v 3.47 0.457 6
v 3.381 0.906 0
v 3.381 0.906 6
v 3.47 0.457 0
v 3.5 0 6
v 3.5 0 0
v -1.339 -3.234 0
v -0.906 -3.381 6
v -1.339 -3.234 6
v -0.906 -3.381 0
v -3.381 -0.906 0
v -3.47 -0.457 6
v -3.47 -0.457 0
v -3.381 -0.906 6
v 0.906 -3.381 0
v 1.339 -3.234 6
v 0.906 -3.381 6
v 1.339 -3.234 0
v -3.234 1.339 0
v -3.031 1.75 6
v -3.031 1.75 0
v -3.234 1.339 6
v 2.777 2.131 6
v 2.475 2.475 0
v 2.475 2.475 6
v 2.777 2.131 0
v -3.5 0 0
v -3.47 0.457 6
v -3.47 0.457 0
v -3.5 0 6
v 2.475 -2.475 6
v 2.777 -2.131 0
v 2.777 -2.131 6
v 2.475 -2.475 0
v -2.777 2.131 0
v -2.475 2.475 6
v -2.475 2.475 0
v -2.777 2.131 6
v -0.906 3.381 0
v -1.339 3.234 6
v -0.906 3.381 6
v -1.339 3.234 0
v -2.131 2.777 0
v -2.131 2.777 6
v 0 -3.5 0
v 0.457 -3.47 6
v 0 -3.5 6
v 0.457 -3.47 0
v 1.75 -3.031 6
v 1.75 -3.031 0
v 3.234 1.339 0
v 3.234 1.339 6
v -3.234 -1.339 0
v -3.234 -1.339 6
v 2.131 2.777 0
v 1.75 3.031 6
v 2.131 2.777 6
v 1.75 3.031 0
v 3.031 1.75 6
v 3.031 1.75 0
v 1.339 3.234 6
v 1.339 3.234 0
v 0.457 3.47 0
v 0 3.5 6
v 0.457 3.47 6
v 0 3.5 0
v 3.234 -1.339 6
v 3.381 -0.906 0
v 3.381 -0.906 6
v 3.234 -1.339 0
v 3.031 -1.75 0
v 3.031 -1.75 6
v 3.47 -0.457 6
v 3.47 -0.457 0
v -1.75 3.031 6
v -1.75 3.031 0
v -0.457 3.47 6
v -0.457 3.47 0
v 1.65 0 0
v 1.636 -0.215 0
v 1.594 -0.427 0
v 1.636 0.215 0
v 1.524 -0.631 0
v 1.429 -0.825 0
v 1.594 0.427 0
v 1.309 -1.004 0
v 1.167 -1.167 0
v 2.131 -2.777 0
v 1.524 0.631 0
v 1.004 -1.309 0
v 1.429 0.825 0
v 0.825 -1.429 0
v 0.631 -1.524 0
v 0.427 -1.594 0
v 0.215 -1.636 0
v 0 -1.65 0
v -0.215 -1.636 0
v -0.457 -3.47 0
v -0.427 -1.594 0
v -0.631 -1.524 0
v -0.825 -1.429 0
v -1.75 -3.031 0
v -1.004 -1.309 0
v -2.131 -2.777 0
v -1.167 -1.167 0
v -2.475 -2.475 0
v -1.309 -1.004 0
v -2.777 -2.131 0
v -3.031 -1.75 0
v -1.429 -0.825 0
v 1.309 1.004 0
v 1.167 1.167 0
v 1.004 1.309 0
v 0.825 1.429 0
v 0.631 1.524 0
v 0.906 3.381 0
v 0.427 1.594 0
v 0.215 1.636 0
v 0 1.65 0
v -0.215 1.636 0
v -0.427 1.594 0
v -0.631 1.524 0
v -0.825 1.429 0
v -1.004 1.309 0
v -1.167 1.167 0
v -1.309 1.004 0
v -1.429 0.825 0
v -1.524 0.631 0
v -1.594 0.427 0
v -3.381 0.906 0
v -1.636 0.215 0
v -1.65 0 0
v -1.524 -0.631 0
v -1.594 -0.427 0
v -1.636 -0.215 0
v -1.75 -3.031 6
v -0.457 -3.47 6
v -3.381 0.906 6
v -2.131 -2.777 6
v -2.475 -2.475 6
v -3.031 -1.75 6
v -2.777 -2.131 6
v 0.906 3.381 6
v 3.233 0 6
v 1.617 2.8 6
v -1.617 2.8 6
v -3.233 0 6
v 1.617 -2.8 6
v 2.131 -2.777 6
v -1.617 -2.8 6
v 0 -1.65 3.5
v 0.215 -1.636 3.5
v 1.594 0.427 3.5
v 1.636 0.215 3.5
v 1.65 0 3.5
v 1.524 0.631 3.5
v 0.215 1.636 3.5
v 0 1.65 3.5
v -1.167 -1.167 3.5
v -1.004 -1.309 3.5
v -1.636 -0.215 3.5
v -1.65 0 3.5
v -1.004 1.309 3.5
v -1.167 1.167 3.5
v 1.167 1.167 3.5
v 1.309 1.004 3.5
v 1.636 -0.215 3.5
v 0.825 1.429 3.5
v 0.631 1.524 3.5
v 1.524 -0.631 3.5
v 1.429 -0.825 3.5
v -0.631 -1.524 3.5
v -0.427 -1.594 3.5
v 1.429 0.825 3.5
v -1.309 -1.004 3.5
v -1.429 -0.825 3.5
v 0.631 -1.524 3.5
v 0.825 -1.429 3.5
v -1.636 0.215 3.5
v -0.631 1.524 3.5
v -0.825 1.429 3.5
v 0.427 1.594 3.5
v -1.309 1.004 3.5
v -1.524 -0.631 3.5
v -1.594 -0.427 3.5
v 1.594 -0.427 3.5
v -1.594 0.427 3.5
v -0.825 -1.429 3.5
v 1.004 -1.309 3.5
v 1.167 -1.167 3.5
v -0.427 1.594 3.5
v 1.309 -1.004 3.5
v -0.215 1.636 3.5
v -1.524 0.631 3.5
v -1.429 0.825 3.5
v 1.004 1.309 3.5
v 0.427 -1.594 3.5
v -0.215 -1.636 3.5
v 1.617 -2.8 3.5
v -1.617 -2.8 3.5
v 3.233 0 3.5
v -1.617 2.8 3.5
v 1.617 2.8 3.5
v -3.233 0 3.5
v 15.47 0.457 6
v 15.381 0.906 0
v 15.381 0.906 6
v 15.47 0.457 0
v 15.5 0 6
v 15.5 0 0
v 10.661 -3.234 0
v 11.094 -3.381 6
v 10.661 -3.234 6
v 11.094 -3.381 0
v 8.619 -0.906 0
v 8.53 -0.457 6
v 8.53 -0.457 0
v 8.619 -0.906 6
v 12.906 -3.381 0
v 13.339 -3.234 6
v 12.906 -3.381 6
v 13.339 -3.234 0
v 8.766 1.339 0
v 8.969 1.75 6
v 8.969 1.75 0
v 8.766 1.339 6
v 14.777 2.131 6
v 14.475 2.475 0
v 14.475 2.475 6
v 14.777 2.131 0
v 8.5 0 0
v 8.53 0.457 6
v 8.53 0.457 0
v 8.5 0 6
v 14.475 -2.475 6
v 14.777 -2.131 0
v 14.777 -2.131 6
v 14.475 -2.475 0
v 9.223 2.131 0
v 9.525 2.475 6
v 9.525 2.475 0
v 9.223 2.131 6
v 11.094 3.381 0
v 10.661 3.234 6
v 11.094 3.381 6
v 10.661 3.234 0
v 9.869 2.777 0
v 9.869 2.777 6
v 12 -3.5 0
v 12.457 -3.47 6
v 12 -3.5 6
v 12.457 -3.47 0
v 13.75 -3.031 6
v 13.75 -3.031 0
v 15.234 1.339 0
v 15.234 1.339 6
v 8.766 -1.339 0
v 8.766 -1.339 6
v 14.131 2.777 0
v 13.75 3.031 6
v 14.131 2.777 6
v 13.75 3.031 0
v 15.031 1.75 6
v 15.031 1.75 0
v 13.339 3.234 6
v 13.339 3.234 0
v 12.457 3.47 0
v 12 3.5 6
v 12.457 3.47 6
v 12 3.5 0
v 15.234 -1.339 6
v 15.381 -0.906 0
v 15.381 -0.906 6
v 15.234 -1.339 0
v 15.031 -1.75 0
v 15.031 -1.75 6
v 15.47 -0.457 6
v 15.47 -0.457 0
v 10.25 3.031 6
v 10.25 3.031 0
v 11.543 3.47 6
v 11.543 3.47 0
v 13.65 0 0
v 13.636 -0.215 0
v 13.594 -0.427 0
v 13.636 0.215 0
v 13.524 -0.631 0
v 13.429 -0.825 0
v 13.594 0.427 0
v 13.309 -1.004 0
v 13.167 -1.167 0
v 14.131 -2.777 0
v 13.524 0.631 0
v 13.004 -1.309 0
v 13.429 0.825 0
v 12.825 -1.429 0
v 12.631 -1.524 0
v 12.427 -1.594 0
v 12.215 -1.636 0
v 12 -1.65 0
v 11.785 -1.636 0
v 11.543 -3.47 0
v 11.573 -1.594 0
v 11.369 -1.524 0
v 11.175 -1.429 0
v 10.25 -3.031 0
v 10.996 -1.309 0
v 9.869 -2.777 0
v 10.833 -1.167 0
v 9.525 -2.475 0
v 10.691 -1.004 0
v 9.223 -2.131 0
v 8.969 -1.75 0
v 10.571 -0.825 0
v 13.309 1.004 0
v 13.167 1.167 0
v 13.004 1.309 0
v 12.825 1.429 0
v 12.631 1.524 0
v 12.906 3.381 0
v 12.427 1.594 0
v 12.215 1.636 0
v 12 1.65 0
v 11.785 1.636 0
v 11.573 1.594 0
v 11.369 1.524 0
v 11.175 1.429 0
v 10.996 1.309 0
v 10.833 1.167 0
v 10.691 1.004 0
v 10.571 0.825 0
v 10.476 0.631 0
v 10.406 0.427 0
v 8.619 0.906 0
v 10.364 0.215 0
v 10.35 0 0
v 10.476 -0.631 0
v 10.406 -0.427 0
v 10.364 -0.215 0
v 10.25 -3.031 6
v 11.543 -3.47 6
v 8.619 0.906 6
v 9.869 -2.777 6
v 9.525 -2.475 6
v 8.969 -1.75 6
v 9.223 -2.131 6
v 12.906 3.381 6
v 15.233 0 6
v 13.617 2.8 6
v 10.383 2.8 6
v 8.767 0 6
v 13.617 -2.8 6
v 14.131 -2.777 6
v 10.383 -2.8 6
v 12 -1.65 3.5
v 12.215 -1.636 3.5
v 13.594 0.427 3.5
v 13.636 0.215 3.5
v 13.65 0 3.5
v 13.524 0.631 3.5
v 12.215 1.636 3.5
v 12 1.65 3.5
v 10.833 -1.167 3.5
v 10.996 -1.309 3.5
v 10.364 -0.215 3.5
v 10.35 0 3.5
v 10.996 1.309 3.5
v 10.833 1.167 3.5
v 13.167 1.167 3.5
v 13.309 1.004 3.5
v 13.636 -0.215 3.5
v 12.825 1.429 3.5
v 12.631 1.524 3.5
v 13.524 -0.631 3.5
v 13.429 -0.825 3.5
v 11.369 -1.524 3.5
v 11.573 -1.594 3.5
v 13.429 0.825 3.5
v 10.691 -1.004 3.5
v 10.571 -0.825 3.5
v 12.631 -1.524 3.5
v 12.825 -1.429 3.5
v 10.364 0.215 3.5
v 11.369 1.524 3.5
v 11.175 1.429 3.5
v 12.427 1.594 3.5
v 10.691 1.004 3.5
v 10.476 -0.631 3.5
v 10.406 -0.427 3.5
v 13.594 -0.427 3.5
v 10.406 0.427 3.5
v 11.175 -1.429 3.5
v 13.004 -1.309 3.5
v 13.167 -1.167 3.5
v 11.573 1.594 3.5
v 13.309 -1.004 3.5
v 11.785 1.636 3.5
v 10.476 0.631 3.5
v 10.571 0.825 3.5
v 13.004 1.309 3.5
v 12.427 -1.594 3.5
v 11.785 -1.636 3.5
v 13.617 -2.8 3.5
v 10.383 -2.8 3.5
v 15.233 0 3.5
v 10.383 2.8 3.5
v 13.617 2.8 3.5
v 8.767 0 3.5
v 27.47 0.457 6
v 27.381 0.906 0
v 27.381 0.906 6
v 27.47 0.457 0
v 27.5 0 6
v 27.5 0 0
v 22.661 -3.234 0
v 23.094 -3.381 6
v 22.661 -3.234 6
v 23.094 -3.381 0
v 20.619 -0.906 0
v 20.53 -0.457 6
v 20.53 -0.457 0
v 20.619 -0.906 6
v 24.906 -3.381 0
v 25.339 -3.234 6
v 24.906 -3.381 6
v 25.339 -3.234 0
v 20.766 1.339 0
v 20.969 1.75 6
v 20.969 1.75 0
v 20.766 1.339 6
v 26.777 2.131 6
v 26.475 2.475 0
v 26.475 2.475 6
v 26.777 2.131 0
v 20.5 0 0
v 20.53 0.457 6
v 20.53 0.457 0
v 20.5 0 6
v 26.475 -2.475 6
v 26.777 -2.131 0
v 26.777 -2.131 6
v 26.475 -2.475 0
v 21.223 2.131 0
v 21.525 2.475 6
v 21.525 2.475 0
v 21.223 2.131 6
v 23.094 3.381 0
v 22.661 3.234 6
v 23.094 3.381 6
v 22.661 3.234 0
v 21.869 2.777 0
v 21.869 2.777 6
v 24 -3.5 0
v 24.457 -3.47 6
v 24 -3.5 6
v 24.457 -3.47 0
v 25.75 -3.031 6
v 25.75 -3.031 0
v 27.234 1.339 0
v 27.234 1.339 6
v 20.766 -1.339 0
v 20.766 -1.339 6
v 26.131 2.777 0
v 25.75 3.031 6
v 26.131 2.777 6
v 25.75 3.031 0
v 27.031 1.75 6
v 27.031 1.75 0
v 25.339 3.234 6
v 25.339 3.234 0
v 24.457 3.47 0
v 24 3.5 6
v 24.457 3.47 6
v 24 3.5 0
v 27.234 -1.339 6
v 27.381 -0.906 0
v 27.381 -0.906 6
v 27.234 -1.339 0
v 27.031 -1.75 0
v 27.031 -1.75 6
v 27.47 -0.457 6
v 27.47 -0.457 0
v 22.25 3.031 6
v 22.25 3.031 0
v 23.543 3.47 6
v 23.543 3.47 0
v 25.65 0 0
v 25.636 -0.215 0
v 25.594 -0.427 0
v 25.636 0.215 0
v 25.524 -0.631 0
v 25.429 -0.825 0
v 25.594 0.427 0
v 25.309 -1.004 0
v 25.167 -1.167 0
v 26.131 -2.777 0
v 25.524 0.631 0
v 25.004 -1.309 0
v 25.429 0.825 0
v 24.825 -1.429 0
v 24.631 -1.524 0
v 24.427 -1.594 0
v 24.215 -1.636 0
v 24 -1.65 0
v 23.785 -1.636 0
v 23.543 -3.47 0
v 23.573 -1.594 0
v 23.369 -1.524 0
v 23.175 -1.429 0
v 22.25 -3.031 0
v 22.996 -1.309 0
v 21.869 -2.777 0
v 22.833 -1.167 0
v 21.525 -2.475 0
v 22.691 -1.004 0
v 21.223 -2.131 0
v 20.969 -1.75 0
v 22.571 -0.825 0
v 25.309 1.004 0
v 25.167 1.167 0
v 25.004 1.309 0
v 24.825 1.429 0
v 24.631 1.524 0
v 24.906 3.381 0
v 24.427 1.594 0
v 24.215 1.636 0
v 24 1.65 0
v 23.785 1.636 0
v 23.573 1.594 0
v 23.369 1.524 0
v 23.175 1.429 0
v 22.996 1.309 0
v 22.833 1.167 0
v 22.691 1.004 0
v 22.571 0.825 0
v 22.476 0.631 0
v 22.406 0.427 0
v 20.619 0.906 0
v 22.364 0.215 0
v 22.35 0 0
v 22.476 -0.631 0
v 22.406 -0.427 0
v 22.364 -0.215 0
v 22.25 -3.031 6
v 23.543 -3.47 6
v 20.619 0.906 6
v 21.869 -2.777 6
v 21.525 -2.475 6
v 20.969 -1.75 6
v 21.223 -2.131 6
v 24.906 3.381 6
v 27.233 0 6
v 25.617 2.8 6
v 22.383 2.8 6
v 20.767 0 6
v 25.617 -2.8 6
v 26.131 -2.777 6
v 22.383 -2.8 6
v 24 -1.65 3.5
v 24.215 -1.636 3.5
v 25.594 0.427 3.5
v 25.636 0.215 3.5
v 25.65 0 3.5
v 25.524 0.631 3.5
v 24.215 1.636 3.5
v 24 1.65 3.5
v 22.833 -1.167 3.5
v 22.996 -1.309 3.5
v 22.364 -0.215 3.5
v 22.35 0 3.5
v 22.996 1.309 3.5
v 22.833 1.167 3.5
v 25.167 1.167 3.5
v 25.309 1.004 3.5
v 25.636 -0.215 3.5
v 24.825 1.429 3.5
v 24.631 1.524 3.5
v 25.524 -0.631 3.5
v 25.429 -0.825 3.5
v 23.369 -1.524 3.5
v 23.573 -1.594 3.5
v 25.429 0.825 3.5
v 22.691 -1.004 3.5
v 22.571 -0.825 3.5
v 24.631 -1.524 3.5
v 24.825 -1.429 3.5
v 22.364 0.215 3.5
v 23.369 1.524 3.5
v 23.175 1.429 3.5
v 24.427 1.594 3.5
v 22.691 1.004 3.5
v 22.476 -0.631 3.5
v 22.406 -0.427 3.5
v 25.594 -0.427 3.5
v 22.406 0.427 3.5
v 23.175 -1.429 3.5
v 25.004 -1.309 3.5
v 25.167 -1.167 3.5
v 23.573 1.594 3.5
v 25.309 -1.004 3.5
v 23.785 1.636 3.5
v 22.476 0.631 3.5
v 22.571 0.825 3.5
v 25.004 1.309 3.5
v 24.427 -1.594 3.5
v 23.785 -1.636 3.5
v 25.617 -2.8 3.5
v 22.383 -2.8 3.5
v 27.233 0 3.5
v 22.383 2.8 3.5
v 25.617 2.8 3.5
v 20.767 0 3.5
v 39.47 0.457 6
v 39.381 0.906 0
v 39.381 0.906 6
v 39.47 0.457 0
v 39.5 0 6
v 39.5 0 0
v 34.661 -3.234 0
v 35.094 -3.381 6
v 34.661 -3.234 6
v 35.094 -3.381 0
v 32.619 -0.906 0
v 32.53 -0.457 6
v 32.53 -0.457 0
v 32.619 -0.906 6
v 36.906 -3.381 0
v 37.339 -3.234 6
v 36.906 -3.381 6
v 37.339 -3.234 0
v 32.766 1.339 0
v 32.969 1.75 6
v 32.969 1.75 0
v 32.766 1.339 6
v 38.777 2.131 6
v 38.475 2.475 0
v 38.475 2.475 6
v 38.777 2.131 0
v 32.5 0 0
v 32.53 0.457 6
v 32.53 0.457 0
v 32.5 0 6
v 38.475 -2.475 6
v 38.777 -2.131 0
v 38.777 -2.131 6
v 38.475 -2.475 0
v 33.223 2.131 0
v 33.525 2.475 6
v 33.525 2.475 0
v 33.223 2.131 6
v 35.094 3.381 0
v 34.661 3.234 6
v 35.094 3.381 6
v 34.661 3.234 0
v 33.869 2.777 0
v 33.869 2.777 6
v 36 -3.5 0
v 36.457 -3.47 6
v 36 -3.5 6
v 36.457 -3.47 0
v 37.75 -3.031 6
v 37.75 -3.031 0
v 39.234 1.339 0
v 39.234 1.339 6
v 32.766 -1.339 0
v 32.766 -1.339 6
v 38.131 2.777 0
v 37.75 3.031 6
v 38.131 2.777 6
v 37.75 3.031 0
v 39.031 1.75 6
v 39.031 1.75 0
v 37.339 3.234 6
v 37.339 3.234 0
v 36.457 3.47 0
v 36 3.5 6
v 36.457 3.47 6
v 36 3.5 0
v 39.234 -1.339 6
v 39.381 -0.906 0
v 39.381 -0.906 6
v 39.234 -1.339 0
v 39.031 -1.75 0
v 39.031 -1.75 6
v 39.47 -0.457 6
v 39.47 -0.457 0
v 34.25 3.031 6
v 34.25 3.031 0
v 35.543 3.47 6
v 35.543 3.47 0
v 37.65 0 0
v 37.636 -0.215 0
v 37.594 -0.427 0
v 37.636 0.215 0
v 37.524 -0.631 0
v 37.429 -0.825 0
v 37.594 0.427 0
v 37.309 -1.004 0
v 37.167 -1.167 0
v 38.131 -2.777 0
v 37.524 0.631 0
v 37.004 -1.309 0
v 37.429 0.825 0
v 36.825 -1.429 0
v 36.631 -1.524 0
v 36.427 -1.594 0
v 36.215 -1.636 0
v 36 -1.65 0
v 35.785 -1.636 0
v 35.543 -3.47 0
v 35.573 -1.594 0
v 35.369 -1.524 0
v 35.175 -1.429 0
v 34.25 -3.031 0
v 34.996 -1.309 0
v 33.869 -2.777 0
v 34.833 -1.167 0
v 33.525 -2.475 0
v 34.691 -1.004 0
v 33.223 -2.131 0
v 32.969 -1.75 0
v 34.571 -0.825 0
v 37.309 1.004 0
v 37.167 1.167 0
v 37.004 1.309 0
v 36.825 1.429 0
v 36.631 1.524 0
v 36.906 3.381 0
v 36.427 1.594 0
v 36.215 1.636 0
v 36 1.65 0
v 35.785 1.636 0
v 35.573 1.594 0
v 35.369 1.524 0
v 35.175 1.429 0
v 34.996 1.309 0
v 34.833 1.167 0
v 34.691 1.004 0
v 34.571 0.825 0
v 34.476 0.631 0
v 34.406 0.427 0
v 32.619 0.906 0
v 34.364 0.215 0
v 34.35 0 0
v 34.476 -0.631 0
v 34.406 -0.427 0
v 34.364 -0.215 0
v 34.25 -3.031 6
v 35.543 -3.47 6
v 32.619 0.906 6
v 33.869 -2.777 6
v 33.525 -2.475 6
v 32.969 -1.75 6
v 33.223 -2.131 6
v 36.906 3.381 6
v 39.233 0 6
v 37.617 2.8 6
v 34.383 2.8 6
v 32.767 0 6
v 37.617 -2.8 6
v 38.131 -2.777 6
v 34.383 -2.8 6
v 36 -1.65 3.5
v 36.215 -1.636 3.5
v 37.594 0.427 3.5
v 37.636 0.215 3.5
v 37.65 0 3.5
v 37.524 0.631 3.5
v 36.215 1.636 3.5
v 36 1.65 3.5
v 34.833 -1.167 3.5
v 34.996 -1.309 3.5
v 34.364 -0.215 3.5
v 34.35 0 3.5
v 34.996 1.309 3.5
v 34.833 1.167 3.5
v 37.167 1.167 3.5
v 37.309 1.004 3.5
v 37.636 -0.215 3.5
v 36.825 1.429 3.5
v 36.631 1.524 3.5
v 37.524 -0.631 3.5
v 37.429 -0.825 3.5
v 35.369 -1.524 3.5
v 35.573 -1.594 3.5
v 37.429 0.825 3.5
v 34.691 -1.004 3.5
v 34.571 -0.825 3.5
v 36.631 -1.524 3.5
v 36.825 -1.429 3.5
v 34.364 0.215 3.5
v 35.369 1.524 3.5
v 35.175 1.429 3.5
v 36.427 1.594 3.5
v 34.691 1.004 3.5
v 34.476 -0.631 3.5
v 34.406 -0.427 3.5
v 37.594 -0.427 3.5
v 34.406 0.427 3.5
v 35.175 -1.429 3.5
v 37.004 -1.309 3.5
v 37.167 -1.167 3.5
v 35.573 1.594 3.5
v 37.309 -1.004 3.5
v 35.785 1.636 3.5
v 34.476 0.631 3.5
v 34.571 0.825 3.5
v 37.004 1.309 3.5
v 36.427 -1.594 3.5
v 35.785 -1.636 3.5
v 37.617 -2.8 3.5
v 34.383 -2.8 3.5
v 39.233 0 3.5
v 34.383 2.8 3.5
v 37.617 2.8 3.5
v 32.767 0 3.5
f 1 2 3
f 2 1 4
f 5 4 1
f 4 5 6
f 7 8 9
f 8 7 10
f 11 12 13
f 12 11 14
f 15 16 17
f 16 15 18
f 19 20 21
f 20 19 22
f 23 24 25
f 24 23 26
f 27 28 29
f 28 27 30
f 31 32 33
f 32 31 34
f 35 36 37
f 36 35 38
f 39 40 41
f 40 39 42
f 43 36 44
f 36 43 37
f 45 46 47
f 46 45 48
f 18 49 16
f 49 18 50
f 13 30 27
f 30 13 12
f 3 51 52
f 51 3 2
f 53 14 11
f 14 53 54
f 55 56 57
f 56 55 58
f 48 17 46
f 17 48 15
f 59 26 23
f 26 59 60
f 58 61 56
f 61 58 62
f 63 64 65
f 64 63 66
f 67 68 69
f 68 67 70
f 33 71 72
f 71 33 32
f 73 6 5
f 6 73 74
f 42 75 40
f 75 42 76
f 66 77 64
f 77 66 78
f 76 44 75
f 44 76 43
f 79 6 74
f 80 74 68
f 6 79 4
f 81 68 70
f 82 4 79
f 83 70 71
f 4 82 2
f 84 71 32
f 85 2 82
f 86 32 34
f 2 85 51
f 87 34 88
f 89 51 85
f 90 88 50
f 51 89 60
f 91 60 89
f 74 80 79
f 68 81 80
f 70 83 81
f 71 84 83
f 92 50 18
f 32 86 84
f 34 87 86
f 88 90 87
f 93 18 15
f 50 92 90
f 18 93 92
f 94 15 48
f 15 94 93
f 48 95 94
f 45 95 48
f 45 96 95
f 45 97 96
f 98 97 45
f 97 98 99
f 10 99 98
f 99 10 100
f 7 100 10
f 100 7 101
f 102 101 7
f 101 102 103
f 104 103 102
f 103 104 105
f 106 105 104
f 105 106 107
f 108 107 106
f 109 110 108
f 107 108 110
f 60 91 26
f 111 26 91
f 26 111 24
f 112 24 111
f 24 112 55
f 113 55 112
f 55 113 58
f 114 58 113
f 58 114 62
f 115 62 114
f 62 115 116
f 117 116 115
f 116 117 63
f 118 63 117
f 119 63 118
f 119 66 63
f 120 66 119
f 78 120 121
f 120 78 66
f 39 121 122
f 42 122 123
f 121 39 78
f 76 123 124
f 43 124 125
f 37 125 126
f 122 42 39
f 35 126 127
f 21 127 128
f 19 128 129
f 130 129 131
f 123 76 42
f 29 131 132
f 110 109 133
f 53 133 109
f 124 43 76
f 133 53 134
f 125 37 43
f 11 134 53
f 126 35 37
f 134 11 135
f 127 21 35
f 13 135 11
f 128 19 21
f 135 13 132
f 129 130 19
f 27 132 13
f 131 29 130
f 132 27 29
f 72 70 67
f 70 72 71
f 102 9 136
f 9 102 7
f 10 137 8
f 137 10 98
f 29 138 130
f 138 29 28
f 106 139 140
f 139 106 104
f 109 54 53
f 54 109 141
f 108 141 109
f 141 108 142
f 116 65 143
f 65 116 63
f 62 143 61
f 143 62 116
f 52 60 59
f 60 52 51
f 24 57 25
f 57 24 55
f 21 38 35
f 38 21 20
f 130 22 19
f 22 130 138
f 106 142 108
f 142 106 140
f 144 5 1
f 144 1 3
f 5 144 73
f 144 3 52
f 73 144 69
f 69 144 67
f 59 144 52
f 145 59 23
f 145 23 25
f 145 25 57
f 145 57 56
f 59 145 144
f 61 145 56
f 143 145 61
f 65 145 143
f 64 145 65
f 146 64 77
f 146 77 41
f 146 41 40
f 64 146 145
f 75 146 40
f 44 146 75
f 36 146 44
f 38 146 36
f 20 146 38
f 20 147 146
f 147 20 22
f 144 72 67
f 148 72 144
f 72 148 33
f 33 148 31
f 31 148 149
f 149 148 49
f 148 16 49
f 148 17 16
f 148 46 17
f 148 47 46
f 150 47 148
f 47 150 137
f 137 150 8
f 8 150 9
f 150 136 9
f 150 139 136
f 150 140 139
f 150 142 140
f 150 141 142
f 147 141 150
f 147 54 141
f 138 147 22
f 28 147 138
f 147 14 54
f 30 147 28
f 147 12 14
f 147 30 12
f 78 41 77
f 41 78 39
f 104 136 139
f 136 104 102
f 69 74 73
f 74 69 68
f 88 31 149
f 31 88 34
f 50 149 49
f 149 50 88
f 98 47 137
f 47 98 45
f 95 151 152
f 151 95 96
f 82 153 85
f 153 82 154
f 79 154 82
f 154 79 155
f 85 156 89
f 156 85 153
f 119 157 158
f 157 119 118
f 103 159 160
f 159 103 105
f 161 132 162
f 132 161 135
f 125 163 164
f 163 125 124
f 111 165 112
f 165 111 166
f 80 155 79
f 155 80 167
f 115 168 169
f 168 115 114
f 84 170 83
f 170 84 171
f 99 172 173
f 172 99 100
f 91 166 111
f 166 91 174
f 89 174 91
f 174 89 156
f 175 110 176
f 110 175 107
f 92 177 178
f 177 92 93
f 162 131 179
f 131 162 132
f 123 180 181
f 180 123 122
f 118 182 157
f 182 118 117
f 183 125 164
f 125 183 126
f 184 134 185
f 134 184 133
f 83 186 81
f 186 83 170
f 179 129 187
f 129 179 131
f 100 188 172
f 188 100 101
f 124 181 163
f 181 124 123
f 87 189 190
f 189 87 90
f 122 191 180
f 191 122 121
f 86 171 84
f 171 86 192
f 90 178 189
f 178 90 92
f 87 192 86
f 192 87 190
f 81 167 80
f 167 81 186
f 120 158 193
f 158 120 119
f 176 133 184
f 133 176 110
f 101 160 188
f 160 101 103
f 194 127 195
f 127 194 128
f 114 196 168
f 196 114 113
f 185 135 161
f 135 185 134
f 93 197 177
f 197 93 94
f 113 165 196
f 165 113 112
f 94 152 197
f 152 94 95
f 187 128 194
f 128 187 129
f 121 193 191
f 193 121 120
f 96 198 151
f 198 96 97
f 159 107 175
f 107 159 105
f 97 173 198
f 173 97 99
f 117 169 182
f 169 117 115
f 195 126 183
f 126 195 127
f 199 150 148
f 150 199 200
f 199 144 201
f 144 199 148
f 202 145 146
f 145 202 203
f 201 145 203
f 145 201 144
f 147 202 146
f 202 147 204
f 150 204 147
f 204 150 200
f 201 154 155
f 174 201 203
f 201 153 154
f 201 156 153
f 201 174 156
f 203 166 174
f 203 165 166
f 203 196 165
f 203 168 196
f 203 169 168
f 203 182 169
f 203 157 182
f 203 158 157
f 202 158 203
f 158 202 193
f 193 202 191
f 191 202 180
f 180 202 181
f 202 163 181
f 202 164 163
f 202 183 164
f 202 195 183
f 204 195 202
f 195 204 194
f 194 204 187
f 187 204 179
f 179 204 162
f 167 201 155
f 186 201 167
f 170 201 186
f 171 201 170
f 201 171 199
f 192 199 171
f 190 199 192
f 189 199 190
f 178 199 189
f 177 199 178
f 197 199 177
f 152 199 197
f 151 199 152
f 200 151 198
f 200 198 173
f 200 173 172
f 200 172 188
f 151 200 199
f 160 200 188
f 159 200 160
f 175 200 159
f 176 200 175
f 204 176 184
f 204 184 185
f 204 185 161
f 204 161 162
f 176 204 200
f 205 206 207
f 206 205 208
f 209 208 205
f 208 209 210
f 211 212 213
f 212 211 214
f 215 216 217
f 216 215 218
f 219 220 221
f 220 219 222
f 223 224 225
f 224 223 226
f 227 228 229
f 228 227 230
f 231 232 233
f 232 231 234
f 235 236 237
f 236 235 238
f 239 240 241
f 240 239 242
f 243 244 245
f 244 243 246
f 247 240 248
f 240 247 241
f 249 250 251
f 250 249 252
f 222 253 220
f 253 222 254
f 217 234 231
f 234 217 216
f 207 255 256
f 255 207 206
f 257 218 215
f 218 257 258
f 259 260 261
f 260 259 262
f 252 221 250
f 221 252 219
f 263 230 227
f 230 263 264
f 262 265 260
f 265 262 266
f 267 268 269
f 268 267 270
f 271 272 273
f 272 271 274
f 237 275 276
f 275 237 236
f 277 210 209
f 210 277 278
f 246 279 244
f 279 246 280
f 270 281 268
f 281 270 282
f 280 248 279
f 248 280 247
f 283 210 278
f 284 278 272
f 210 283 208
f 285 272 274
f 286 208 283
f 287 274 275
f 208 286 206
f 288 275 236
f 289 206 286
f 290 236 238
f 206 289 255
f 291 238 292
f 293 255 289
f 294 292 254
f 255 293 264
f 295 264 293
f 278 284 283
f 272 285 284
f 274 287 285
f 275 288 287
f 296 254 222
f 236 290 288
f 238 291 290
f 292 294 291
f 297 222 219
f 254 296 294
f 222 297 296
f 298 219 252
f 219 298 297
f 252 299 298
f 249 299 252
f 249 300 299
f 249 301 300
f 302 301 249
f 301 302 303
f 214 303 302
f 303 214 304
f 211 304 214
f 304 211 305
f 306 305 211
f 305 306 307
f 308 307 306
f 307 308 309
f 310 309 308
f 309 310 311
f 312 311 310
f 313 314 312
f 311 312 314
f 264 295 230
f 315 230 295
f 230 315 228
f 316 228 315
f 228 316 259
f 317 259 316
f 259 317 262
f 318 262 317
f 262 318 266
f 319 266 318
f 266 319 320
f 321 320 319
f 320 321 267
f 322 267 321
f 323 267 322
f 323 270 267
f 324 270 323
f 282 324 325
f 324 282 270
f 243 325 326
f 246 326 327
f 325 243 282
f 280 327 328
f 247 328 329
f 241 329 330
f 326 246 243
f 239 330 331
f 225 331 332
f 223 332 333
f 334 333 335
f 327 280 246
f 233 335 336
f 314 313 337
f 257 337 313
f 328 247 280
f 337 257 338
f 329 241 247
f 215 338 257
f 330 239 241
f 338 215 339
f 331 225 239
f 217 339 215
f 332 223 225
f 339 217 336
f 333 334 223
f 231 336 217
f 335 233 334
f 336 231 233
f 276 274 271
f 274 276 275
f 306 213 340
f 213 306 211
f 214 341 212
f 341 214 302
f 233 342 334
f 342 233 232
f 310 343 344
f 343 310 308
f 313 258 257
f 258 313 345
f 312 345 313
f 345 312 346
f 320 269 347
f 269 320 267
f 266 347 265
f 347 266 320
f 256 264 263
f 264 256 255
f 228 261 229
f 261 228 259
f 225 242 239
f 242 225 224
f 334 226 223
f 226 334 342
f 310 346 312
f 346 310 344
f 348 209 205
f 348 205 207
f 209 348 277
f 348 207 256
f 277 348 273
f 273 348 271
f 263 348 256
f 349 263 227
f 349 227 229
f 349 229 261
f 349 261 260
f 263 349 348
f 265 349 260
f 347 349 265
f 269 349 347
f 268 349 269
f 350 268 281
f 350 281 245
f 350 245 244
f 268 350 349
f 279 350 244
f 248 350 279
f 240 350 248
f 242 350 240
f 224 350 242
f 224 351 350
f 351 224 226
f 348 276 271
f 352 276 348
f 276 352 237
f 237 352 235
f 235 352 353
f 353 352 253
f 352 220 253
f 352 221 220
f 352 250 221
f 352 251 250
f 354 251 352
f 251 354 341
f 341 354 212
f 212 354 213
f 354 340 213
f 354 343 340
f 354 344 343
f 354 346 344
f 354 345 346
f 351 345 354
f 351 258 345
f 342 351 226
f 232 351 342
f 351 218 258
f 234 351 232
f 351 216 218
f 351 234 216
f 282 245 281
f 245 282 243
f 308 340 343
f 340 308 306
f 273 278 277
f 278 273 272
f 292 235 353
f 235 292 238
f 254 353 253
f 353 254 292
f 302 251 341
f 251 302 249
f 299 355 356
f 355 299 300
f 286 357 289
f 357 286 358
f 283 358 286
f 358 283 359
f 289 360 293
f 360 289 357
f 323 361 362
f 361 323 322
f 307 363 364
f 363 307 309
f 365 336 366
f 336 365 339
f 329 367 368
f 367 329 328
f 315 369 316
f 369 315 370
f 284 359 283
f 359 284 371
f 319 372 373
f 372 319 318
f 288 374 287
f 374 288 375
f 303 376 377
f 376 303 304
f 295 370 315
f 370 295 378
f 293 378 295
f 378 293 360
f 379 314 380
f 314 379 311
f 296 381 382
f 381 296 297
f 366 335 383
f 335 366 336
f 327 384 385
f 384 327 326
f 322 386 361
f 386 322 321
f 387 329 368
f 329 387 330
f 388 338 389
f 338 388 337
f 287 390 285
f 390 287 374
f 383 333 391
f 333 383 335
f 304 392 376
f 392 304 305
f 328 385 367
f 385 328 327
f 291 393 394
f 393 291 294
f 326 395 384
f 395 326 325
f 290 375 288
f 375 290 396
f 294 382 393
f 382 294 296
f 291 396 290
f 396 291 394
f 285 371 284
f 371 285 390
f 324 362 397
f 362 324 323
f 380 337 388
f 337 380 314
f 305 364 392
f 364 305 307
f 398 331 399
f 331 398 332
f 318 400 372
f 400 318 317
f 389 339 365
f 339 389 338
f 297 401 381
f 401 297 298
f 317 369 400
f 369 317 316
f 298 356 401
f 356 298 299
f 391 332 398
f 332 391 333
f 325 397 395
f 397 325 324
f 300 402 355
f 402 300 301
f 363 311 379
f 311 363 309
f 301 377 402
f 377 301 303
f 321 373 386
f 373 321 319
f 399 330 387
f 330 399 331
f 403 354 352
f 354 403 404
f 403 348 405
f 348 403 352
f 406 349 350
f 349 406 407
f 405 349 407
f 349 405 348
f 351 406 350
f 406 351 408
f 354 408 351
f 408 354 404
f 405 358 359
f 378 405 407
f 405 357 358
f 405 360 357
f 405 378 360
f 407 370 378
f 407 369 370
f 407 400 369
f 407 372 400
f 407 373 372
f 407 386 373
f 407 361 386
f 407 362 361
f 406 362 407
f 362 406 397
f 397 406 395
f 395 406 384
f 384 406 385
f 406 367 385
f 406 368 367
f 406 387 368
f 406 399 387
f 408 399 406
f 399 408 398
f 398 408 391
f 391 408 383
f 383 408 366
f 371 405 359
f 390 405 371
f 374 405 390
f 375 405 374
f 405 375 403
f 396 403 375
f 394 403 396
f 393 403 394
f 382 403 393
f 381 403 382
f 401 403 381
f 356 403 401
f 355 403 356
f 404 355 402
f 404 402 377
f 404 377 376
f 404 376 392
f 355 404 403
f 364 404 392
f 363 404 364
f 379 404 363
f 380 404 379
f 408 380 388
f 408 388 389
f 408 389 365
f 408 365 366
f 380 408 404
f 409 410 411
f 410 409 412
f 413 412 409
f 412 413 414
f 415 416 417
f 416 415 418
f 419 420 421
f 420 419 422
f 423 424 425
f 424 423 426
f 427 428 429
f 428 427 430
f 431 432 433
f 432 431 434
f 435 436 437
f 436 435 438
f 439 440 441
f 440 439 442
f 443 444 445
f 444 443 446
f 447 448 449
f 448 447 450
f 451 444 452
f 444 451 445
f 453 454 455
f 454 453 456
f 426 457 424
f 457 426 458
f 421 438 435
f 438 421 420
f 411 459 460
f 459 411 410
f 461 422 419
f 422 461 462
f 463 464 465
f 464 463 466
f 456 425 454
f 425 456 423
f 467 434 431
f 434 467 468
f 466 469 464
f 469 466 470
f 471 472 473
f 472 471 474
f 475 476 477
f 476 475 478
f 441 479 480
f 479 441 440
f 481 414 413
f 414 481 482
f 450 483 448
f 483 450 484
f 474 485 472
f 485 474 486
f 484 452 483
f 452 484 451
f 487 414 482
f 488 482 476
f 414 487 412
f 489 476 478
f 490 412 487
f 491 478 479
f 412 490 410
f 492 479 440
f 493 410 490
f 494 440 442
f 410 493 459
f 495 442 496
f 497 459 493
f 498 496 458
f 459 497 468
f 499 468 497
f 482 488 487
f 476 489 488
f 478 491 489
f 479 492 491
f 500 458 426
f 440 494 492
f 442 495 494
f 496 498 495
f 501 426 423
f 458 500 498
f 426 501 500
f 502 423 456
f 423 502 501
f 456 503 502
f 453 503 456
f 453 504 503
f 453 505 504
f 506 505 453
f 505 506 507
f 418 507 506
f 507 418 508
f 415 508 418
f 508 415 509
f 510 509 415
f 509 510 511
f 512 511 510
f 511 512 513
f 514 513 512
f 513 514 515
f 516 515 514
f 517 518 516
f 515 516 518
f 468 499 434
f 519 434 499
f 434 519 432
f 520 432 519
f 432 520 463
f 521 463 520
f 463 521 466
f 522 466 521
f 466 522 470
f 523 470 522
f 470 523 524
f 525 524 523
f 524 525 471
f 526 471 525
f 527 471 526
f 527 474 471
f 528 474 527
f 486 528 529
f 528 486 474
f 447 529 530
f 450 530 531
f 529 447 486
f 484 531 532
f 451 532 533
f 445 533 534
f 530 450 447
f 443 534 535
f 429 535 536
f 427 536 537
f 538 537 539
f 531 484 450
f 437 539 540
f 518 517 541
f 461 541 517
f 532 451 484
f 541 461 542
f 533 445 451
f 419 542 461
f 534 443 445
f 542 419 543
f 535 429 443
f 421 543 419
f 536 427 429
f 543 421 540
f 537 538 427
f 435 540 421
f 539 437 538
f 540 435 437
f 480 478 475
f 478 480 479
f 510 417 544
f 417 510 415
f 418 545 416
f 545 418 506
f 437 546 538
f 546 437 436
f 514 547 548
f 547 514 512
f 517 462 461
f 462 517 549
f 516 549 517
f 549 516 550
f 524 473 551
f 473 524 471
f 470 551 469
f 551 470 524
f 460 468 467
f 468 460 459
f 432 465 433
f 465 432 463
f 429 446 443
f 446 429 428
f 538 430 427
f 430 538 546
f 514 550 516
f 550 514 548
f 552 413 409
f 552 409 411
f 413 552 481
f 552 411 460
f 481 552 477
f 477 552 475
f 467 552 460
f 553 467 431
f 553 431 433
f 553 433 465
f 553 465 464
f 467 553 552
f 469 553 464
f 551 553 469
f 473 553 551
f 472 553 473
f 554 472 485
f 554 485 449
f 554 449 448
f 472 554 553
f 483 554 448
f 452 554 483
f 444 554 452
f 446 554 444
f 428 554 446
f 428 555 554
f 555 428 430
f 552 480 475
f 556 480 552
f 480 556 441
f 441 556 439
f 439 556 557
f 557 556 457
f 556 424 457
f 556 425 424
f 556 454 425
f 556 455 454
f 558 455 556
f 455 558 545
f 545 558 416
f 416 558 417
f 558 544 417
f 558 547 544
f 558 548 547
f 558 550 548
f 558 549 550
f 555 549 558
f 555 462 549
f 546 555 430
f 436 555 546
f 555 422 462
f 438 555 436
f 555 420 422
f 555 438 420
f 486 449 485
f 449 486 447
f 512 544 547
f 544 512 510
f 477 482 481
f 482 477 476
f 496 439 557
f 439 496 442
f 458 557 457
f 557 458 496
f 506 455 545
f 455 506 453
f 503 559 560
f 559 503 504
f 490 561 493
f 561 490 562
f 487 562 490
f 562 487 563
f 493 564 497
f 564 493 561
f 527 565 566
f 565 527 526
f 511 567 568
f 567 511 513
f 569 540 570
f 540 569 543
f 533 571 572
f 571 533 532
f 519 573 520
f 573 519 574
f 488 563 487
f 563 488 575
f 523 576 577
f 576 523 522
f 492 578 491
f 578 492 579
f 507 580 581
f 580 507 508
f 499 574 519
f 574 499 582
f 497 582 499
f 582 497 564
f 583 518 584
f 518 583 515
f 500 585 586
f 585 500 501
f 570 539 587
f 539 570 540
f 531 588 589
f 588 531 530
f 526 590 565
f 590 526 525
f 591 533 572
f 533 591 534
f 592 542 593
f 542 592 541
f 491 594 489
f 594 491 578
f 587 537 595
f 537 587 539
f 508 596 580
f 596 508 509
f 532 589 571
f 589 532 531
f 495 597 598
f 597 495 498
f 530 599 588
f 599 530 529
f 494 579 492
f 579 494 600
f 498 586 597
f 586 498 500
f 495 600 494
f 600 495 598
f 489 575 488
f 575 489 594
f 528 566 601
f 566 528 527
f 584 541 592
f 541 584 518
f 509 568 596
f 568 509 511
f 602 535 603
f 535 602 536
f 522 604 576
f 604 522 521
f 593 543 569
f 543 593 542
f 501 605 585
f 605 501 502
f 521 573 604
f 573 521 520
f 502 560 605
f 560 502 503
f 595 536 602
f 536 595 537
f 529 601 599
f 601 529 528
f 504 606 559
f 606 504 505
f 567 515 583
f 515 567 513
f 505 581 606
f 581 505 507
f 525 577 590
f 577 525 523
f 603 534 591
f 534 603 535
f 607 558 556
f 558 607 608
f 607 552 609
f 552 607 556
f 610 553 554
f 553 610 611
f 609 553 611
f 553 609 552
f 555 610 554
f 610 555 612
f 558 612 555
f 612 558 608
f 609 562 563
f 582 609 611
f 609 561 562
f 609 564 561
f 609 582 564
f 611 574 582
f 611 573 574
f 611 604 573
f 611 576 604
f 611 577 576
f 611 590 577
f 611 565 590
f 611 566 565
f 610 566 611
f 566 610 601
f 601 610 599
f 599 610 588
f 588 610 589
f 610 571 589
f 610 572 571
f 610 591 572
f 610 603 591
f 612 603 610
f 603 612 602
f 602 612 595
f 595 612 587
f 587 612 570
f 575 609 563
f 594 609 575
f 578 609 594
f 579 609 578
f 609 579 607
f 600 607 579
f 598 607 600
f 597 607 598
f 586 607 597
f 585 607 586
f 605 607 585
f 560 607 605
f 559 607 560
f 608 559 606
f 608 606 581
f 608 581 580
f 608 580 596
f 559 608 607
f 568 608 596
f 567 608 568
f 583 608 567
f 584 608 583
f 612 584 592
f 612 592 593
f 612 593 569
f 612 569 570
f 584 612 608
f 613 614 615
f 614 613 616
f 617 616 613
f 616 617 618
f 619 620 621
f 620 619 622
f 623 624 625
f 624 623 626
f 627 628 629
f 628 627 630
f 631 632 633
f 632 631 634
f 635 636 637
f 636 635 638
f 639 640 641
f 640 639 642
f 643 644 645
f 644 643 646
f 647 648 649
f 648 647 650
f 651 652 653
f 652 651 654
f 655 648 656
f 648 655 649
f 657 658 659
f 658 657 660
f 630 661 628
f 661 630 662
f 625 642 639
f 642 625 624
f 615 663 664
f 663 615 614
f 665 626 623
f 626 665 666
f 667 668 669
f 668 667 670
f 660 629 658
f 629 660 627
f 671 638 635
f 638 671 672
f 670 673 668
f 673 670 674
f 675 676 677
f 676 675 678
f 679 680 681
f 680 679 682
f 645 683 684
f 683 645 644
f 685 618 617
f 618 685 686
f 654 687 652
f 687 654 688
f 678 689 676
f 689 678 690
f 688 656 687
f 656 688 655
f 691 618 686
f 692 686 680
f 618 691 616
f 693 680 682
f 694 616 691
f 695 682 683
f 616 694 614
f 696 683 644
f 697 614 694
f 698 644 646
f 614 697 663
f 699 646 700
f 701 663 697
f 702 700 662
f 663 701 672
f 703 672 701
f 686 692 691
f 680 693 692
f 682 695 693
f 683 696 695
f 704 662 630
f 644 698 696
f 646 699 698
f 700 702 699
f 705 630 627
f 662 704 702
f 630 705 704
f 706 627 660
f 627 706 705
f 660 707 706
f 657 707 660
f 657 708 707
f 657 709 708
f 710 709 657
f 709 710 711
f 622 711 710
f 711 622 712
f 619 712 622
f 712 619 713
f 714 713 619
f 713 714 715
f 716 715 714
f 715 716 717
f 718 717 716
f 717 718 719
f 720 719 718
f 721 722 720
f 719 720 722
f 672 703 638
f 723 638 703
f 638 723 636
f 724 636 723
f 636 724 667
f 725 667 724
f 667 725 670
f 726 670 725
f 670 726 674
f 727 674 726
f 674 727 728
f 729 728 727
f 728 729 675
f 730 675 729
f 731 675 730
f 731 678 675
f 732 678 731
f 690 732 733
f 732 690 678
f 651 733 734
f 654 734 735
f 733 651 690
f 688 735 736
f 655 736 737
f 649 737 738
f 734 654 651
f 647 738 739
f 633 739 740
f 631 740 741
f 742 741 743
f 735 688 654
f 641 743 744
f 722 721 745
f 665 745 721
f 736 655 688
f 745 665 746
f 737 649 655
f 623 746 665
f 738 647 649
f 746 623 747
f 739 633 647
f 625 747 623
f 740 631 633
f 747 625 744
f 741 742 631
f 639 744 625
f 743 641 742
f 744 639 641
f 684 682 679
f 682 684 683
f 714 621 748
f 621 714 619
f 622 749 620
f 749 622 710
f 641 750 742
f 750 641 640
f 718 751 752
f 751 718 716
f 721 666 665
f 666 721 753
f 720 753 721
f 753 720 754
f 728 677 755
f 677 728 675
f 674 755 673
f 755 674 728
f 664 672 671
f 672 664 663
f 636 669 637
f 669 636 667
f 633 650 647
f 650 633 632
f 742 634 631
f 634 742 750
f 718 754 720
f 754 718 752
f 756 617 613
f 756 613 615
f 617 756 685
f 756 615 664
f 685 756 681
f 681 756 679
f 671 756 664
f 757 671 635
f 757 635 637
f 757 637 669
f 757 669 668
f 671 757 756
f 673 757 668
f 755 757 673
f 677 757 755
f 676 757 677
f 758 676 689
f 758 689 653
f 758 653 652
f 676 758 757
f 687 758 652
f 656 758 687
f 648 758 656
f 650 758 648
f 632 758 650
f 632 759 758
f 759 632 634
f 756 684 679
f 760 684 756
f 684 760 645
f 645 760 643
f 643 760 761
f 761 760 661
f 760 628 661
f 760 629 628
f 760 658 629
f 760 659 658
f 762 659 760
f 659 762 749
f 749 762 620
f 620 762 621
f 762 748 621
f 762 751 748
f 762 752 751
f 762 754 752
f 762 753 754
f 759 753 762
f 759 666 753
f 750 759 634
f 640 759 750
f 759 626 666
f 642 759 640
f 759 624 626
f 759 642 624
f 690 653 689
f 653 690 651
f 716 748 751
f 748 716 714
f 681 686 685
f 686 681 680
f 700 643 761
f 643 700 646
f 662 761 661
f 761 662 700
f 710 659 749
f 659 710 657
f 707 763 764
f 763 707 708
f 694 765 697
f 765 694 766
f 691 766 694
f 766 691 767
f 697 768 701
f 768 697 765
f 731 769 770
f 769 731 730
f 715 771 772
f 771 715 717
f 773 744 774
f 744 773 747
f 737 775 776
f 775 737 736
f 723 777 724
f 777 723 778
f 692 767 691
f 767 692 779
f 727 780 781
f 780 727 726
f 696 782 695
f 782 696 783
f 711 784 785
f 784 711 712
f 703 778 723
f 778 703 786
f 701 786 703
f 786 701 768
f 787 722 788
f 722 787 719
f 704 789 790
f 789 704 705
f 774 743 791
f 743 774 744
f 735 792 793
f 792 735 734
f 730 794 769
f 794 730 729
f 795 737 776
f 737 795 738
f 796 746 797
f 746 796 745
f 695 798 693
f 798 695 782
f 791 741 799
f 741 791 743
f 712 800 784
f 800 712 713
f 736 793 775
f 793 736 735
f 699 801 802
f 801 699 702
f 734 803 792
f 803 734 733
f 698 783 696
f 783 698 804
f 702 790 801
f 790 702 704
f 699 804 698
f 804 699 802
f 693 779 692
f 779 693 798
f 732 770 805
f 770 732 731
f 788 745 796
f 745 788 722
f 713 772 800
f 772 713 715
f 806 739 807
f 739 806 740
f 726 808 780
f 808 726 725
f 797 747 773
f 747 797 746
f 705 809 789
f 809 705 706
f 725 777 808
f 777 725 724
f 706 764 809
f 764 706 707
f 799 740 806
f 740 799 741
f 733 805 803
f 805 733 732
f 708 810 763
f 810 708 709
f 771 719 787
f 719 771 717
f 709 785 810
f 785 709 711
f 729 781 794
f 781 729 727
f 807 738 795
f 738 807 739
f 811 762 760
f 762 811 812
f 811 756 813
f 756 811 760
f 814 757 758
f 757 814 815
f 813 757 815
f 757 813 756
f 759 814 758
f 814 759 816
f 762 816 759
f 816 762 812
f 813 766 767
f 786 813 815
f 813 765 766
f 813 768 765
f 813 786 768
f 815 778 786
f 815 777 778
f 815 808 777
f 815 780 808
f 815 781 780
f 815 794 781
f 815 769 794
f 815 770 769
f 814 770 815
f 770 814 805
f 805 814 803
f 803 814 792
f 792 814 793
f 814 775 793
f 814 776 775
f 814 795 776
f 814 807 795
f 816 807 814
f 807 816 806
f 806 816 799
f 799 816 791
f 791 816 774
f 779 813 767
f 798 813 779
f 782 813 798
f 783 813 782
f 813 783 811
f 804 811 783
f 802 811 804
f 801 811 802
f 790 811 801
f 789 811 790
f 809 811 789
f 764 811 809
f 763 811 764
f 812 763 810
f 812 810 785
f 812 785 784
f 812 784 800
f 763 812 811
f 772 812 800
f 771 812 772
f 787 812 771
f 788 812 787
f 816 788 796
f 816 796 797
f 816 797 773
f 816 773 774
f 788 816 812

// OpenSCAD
// file: params.scad
// params.scad — 단일 진실 원천 (모든 .scad 가 include)
//
// 변경 시 다른 파일 안 건드려도 됨. 측정값이 다르면 여기만 수정.
// 단위: mm.

// ────────────────────────────────────────────────────────────────
// HSP 94118 차체 (1/10 short course) — 사용자 측정값으로 보정 권장
// ────────────────────────────────────────────────────────────────
// 차체에 박혀 있는 4개의 body post 가 deck 의 mounting feet 와 맞물림.
// 자기 차체 분해해서 자/캘리퍼로 측정해서 다음 두 값을 갱신.
chassis_post_spacing_x = 215;   // 앞뒤 post 간 거리
chassis_post_spacing_y = 170;   // 좌우 post 간 거리
chassis_post_diameter  = 6;     // body post 굵기
chassis_post_clip_d    = 1.5;   // body clip 핀 굵기 (수평 관통)
chassis_post_height    = 80;    // chassis 윗면 ~ post 끝 높이

// ────────────────────────────────────────────────────────────────
// 데크 플레이트
// ────────────────────────────────────────────────────────────────
deck_thickness    = 4;          // 4mm PLA = 충분한 강성
deck_margin_x     = 15;         // post 바깥쪽 여유 (앞뒤)
deck_margin_y     = 10;         // post 바깥쪽 여유 (좌우)
deck_corner_r     = 8;          // 모서리 둥글기

deck_size_x = chassis_post_spacing_x + 2 * deck_margin_x;   // 245
deck_size_y = chassis_post_spacing_y + 2 * deck_margin_y;   // 190

// 데크 mounting foot — body post 가 끼는 구멍 + body clip 슬롯
foot_clearance     = 0.4;       // post 와 hole 간격 (PLA 수축 보정)
foot_hole_d        = chassis_post_diameter + foot_clearance;
foot_clip_slot_w   = chassis_post_clip_d + 0.4;
foot_clip_slot_h   = 2.0;       // 슬롯 세로 길이 (post 위아래 위치 조정 여유)

// ────────────────────────────────────────────────────────────────
// Jetson Orin Nano Super Dev Kit
// ────────────────────────────────────────────────────────────────
// 캐리어 보드 (J401/J501 호환 dev kit 기준).
jetson_pcb_x       = 100;
jetson_pcb_y       = 79;
jetson_pcb_z       = 1.6;       // PCB 두께
jetson_hole_dx     = 86;        // 4 모서리 M3 홀 가로 간격
jetson_hole_dy     = 58;        // 세로 간격
jetson_hole_d      = 3.3;       // M3 통과
jetson_standoff_h  = 6;         // PCB 바닥 ~ deck 사이 여유 (heatsink 고려해 deck 윗면에 설치)
jetson_total_z     = 30;        // PCB + heatsink/fan 전체 높이 (충돌 회피용)

// ────────────────────────────────────────────────────────────────
// STM32 NUCLEO-H753ZI
// ────────────────────────────────────────────────────────────────
nucleo_pcb_x       = 140;
nucleo_pcb_y       = 70;
nucleo_pcb_z       = 1.6;
// NUCLEO 보드 4 모서리 M3 마운팅 홀 — 데이터시트 UM2407 figure 6 참조.
// 측정값과 다르면 보정.
nucleo_hole_dx     = 130;
nucleo_hole_dy     = 60;
nucleo_hole_d      = 3.3;
nucleo_standoff_h  = 5;
nucleo_total_z     = 18;        // ST-LINK 부품 포함 위쪽 높이

// ────────────────────────────────────────────────────────────────
// IMX219 카메라 모듈 (Arducam/Waveshare 표준 보드)
// ────────────────────────────────────────────────────────────────
imx219_pcb_x       = 25;
imx219_pcb_y       = 24;
imx219_pcb_z       = 1.0;
imx219_hole_dx     = 21;
imx219_hole_dy     = 12.5;
imx219_hole_d      = 2.4;       // M2 통과 (2.0 + 0.4 클리어런스)
imx219_lens_offset_y = 2.5;     // 렌즈 중심이 PCB 중심에서 살짝 위
imx219_lens_d      = 7.0;       // 렌즈 마운트 외경

// 스테레오 baseline (사용자 선택: 80mm)
camera_baseline    = 80;
camera_tilt_deg    = 8;         // 도로 8° 아래로 향함 (기본값, 슬롯으로 ±15° 조정)

// ────────────────────────────────────────────────────────────────
// 카메라 마스트 (전방 수직 봉)
// ────────────────────────────────────────────────────────────────
mast_height        = 60;        // deck 위에서 60mm
mast_base_thickness = 4;
mast_arm_thickness = 3;
mast_arm_width     = 8;

// ────────────────────────────────────────────────────────────────
// 배터리 (LiPo 2S, 일반적인 5000mAh hard-case 가정)
// ────────────────────────────────────────────────────────────────
battery_x = 140;
battery_y = 47;
battery_z = 25;
battery_strap_w = 12;           // 벨크로 스트랩 슬롯 너비

// ────────────────────────────────────────────────────────────────
// 커버 셸 (RC 바디 대체)
// ────────────────────────────────────────────────────────────────
cover_thickness    = 2.4;       // 얇게 (가벼움 + 빠른 출력)
cover_height       = 95;        // deck 위 95mm — Jetson + 여유
cover_overhang     = 5;         // deck 가장자리 바깥으로 빠지는 양
cover_vent_slot_w  = 4;
cover_vent_slot_l  = 30;

// ────────────────────────────────────────────────────────────────
// 공통
// ────────────────────────────────────────────────────────────────
$fn = 48;                       // 렌더 해상도
m3_nut_w           = 5.6;       // M3 너트 평면 거리 (육각 across-flats)
m3_nut_h           = 2.5;       // M3 너트 두께
m3_head_d          = 6.0;       // M3 캡헤드 외경
m3_head_h          = 3.0;
// main file
// jetson_tray.scad — Jetson Orin Nano Super Dev Kit standoff 4개.
//
// deck 에 그냥 M3 볼트 + 너트로 직접 고정해도 되지만,
// standoff 가 있으면 (1) 케이블 라우팅 공간 확보, (2) 발열 분리, (3) 진동 흡수 (TPU 출력 시).
//
// 이 파일은 standoff 4개 한 세트. PLA 출력 가능하지만 흡수 위해서는 TPU 권장.

include <params.scad>;

module standoff(h, outer_d=7, hole_d=jetson_hole_d) {
    difference() {
        cylinder(d=outer_d, h=h);
        translate([0, 0, -0.1])
            cylinder(d=hole_d, h=h + 0.2);
        // 위쪽 너트 포켓 (heat-set insert 대신 너트 끼워 넣을 수도 있음)
        translate([0, 0, h - m3_nut_h])
            cylinder(d=m3_nut_w / cos(30), h=m3_nut_h + 0.1, $fn=6);
    }
}

// 4개 동시 출력 (출력 베드 한 번에)
spacing = 12;
for (i = [0:3])
    translate([i * spacing, 0, 0])
        standoff(jetson_standoff_h);
